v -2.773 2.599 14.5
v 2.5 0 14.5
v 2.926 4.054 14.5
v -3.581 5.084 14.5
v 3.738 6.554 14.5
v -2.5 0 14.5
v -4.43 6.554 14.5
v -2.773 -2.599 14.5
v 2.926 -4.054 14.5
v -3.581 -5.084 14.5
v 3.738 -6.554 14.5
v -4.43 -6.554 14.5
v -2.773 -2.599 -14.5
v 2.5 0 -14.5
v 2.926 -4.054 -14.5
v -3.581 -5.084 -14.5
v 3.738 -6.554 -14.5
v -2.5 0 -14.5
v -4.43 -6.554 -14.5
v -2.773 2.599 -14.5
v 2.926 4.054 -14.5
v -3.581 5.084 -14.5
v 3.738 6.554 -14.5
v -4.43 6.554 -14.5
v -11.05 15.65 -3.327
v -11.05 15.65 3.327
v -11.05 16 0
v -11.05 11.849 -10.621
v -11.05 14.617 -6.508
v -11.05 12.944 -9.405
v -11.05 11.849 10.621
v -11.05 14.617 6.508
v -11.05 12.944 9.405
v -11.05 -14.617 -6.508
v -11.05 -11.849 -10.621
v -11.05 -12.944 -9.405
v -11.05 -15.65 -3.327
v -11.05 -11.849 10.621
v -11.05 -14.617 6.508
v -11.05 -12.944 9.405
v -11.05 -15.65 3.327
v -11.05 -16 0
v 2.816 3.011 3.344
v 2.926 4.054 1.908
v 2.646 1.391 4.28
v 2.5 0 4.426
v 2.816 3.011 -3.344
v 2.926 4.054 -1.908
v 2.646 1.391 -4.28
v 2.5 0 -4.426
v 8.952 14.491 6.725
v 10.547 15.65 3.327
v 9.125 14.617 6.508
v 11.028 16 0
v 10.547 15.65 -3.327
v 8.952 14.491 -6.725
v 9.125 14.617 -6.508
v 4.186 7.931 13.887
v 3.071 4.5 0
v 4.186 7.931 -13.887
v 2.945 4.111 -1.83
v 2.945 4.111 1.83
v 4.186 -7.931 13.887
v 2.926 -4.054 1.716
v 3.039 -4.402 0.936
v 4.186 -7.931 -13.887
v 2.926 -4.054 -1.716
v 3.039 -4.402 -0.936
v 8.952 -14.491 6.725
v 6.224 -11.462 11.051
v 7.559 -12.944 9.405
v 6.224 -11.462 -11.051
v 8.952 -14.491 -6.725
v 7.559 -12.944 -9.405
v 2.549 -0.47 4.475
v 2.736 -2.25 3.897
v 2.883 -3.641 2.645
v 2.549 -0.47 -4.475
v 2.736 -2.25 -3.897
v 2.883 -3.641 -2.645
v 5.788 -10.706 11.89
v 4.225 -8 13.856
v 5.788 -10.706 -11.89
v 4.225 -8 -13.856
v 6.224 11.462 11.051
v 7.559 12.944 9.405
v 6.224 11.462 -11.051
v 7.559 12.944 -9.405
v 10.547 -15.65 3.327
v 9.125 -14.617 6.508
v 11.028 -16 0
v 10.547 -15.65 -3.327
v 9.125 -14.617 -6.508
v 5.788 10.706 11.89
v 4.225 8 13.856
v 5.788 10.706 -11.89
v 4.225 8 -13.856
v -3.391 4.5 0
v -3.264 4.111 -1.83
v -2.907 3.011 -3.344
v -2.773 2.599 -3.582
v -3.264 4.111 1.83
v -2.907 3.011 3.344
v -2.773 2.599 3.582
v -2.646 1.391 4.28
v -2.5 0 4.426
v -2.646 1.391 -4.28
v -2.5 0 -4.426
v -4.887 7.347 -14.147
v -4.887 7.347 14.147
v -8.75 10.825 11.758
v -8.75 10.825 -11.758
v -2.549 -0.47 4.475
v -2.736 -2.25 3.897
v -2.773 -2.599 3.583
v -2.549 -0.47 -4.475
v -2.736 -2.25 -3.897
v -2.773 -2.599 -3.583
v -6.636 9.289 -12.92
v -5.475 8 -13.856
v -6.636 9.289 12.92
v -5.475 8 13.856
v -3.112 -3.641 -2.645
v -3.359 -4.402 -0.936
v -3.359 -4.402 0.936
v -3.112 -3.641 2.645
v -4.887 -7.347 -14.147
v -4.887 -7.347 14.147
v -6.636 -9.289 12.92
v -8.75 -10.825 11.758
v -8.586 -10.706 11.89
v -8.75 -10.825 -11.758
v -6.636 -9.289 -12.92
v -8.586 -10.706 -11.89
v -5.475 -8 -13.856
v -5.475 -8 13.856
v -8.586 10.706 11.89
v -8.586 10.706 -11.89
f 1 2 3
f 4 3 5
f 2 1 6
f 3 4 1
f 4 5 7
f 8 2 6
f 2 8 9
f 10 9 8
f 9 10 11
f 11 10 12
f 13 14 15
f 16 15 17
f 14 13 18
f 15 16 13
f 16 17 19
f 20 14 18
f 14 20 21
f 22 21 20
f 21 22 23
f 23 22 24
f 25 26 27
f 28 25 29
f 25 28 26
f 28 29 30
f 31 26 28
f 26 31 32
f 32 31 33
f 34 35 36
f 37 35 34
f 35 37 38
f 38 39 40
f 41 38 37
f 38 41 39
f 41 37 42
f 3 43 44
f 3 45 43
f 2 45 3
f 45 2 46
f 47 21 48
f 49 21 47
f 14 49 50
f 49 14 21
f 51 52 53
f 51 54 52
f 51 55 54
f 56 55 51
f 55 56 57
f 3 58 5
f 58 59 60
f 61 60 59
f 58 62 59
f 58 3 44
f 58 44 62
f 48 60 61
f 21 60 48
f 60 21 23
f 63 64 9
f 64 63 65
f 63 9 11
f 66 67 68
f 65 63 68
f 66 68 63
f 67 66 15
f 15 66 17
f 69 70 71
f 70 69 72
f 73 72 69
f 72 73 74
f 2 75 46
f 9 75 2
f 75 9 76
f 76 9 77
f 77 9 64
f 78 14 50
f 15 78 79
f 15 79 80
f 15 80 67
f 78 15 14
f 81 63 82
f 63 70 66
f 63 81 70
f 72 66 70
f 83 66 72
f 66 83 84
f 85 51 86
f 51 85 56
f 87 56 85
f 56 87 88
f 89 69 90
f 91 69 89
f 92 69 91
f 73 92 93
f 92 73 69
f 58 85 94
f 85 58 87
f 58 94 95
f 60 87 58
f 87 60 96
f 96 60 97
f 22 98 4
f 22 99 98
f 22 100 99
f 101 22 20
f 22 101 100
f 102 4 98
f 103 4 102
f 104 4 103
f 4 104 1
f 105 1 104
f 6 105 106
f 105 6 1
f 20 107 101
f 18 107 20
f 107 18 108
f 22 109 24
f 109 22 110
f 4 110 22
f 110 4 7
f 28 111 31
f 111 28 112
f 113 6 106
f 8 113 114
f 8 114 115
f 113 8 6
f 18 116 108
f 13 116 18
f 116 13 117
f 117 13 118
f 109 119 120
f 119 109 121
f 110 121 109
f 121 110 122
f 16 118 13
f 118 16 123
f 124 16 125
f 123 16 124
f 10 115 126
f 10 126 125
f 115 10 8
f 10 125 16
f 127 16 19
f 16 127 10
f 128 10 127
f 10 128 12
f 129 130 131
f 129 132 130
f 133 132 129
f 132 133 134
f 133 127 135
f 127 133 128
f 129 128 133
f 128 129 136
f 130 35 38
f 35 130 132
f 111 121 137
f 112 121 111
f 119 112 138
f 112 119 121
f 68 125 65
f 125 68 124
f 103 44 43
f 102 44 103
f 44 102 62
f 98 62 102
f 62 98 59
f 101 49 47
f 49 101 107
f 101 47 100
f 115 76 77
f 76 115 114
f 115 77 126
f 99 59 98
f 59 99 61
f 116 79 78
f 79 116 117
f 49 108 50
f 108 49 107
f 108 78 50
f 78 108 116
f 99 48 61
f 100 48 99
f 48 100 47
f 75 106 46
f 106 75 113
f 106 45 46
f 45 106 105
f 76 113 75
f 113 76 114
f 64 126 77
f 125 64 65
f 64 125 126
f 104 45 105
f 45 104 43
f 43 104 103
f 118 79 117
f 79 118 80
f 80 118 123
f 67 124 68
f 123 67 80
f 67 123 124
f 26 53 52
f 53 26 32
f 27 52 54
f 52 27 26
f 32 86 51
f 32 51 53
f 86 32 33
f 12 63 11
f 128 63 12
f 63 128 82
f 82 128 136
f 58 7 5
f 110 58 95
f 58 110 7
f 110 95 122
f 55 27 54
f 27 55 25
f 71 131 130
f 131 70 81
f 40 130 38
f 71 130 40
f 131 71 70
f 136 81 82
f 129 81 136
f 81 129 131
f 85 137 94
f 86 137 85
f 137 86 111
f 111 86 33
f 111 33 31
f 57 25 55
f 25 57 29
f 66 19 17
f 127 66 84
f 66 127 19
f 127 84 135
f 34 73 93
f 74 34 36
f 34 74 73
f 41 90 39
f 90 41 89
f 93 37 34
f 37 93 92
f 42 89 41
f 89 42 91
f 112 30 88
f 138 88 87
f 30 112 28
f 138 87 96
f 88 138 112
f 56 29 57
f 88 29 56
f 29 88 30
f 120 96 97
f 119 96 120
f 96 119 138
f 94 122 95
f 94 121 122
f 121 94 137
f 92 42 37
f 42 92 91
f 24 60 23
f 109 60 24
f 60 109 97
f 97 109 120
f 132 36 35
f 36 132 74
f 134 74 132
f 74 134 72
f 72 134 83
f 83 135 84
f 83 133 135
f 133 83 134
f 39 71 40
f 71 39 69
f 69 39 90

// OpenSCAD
radius1 = 39 / 2;
radius2 = 25 / 2;
separation = 5;
height = 30;
screwHole = 4.5;

module trampclamp()
{		
    intersection() {
        difference() {
            translate([0.25*(radius1-radius2), 0, 0])
            cube([0.8*(radius1 + radius2),2*radius1 , height-1 ], center = true);
            translate([radius1+separation/2, 0, 0])
            cylinder(h = height, r = radius1, center = true);	
            translate([-(radius2+separation/2), 0, 0])
            cylinder(h = height, r = radius2, center = true);	
            rotate([90,0,90])
            cylinder(h = separation*2, r = screwHole, center = true);	
        };
    
        rotate([90,0,90]) cylinder(h = height, r = height/2+1, center = true);
    }
}

trampclamp();
